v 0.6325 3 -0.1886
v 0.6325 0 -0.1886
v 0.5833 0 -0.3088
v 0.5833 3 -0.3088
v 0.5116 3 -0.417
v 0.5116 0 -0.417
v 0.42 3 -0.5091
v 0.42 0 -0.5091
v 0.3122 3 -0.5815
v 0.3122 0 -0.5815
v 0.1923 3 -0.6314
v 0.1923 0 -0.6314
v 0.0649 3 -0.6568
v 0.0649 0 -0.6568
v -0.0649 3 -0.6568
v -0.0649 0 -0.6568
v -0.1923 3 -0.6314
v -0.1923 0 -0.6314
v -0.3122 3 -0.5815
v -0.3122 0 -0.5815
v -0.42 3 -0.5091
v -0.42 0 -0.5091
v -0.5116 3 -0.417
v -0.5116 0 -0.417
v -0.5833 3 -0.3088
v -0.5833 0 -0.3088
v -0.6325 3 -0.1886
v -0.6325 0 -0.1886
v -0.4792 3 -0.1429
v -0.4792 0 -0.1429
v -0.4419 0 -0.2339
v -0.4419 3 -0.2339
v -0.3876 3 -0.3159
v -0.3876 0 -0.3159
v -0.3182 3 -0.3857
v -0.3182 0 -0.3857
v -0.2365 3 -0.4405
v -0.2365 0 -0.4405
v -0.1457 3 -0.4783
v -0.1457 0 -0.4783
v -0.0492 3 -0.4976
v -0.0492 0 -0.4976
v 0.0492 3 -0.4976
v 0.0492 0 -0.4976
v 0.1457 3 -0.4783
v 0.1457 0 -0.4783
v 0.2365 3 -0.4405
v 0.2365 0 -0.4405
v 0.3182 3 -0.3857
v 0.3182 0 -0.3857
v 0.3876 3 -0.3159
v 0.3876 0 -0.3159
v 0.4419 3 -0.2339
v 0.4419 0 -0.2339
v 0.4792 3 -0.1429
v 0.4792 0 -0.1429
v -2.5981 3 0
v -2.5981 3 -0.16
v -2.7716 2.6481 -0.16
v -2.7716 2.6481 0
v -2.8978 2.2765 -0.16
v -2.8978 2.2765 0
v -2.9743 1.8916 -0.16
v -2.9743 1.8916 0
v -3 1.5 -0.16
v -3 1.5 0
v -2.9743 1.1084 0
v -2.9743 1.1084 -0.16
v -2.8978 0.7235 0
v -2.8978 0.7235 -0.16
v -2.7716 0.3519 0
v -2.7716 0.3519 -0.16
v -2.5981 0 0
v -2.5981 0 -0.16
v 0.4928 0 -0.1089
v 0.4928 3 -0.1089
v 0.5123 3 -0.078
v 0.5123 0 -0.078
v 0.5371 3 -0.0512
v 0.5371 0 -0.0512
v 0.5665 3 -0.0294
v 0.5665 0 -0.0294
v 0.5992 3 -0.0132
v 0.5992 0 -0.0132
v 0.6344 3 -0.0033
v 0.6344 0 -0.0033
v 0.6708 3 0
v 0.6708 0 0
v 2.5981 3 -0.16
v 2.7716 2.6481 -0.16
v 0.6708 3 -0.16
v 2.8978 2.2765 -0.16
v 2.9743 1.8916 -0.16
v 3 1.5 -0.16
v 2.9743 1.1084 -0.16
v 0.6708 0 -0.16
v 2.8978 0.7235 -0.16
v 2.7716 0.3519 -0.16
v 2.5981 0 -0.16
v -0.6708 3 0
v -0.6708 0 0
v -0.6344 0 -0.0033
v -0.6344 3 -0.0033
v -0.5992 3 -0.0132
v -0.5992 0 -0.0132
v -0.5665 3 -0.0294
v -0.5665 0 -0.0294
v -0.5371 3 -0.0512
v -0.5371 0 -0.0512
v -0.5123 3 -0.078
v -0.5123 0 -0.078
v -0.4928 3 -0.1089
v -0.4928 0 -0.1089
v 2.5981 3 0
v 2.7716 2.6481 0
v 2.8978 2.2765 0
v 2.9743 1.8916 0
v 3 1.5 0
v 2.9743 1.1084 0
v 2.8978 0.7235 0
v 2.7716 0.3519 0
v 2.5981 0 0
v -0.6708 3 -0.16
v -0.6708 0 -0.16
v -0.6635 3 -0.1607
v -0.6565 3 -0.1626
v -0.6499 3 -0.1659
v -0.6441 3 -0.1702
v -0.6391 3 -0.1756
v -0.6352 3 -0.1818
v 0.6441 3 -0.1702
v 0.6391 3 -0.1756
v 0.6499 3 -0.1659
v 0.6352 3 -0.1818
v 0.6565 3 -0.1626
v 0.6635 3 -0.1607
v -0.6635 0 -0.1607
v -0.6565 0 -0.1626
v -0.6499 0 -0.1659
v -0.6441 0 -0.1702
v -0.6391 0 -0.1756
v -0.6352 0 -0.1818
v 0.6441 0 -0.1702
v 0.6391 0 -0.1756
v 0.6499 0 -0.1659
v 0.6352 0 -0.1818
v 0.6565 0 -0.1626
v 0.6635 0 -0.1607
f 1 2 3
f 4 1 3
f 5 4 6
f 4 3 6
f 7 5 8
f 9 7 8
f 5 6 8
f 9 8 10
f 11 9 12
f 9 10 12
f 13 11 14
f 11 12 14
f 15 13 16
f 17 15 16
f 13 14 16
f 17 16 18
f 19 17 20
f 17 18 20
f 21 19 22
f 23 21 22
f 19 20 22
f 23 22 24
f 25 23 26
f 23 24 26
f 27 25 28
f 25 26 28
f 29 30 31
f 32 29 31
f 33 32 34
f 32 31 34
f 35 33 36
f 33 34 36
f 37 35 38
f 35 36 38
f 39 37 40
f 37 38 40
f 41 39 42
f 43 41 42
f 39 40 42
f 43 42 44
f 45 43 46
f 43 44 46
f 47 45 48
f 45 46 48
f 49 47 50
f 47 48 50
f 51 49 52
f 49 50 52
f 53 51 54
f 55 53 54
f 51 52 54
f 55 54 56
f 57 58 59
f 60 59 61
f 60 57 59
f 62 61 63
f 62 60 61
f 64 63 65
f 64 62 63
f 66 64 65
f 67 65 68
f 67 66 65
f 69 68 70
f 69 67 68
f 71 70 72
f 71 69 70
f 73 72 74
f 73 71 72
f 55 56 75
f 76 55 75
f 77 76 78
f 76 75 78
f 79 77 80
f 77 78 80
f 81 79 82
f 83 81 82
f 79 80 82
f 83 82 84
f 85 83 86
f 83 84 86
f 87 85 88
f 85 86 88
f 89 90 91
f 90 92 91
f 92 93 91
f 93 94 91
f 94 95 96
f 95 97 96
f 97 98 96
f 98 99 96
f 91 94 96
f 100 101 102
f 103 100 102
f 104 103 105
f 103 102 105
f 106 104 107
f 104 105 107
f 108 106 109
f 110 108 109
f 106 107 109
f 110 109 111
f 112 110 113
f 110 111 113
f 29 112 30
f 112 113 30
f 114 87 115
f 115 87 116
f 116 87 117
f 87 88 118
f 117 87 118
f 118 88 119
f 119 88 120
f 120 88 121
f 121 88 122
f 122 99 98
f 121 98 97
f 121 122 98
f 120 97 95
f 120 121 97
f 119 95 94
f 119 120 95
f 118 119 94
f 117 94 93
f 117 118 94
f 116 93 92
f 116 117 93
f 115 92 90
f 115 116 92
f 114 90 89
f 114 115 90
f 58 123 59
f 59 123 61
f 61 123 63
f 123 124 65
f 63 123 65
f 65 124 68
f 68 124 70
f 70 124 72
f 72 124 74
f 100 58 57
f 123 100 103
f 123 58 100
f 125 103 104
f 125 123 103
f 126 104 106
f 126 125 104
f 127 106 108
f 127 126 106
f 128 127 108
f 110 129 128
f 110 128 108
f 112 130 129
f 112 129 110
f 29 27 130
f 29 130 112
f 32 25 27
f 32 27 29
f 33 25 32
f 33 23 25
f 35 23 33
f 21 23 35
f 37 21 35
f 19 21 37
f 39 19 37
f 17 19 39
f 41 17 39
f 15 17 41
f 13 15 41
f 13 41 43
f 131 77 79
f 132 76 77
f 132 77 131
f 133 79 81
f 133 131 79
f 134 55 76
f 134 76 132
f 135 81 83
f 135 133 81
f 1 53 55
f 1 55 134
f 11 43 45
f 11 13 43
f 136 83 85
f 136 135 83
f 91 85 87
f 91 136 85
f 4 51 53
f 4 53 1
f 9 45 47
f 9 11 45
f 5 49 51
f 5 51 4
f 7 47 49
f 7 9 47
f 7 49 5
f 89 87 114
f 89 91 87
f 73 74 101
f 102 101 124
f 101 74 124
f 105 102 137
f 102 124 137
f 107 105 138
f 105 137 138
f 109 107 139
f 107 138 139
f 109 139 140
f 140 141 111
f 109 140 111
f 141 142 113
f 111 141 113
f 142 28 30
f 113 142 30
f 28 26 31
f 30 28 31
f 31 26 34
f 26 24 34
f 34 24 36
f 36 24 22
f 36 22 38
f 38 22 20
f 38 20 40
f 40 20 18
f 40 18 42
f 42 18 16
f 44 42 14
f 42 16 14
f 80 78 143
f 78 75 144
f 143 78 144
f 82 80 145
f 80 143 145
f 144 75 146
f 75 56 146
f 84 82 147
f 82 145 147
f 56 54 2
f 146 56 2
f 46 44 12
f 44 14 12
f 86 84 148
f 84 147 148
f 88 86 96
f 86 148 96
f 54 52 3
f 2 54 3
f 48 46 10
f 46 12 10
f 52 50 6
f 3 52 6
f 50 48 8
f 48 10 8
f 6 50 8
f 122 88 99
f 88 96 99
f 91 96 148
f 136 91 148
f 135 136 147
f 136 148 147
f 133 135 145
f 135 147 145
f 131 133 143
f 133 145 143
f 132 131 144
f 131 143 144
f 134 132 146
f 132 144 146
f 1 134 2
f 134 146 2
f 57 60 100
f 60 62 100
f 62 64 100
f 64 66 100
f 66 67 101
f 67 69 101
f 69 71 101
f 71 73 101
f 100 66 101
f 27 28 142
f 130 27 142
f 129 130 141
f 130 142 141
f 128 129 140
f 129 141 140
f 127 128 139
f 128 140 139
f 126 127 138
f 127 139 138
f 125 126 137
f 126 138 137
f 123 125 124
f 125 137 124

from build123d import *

# Parameters (mm, degrees)
EXTRUDE_THIN1_DEPTH = 3
SKETCH2_OUTSIDE_W   = 9.348
SKETCH2_OUTSIDE_H   = 6.348
SKETCH2_OUTSIDE_R   = 3
EXTRUDE2_DEPTH      = 5.293669759


with BuildPart() as part:
    # Sketch1 → Extrude-Thin1 (new body)
    with BuildSketch(Plane(origin=(0, 0, 0), x_dir=(1, 0, 0), z_dir=(0, 1, 0))):
        with BuildLine():
            Line((-3, 0), (-0.670820393, 0))
            ThreePointArc((-0.670820393, 0), (-0.551297532, 0.039643255), (-0.479157424, 0.142857143))
            ThreePointArc((-0.479157424, 0.142857143), (0, 0.5), (0.479157424, 0.142857143))
            ThreePointArc((0.479157424, 0.142857143), (0.551297532, 0.039643255), (0.670820393, 0))
            Line((0.670820393, 0), (3, 0))
            Line((3, 0), (3, 0.16))
            Line((3, 0.16), (0.670820393, 0.16))
            ThreePointArc((0.670820393, 0.16), (0.646915821, 0.167928651), (0.632487799, 0.188571429))
            ThreePointArc((0.632487799, 0.188571429), (0, 0.66), (-0.632487799, 0.188571429))
            ThreePointArc((-0.632487799, 0.188571429), (-0.646915821, 0.167928651), (-0.670820393, 0.16))
            Line((-0.670820393, 0.16), (-3, 0.16))
            Line((-3, 0.16), (-3, 0))
        make_face()
    extrude(amount=EXTRUDE_THIN1_DEPTH)

    # Sketch2 outside → Extrude2 (cut, through all)
    with BuildSketch(Plane.XY):
        with Locations((0, 1.5)):
            Rectangle(SKETCH2_OUTSIDE_W, SKETCH2_OUTSIDE_H)
        with Locations((0, 1.5)):
            Circle(SKETCH2_OUTSIDE_R, mode=Mode.SUBTRACT)
    extrude(amount=-EXTRUDE2_DEPTH, mode=Mode.SUBTRACT)


solid = part.part
